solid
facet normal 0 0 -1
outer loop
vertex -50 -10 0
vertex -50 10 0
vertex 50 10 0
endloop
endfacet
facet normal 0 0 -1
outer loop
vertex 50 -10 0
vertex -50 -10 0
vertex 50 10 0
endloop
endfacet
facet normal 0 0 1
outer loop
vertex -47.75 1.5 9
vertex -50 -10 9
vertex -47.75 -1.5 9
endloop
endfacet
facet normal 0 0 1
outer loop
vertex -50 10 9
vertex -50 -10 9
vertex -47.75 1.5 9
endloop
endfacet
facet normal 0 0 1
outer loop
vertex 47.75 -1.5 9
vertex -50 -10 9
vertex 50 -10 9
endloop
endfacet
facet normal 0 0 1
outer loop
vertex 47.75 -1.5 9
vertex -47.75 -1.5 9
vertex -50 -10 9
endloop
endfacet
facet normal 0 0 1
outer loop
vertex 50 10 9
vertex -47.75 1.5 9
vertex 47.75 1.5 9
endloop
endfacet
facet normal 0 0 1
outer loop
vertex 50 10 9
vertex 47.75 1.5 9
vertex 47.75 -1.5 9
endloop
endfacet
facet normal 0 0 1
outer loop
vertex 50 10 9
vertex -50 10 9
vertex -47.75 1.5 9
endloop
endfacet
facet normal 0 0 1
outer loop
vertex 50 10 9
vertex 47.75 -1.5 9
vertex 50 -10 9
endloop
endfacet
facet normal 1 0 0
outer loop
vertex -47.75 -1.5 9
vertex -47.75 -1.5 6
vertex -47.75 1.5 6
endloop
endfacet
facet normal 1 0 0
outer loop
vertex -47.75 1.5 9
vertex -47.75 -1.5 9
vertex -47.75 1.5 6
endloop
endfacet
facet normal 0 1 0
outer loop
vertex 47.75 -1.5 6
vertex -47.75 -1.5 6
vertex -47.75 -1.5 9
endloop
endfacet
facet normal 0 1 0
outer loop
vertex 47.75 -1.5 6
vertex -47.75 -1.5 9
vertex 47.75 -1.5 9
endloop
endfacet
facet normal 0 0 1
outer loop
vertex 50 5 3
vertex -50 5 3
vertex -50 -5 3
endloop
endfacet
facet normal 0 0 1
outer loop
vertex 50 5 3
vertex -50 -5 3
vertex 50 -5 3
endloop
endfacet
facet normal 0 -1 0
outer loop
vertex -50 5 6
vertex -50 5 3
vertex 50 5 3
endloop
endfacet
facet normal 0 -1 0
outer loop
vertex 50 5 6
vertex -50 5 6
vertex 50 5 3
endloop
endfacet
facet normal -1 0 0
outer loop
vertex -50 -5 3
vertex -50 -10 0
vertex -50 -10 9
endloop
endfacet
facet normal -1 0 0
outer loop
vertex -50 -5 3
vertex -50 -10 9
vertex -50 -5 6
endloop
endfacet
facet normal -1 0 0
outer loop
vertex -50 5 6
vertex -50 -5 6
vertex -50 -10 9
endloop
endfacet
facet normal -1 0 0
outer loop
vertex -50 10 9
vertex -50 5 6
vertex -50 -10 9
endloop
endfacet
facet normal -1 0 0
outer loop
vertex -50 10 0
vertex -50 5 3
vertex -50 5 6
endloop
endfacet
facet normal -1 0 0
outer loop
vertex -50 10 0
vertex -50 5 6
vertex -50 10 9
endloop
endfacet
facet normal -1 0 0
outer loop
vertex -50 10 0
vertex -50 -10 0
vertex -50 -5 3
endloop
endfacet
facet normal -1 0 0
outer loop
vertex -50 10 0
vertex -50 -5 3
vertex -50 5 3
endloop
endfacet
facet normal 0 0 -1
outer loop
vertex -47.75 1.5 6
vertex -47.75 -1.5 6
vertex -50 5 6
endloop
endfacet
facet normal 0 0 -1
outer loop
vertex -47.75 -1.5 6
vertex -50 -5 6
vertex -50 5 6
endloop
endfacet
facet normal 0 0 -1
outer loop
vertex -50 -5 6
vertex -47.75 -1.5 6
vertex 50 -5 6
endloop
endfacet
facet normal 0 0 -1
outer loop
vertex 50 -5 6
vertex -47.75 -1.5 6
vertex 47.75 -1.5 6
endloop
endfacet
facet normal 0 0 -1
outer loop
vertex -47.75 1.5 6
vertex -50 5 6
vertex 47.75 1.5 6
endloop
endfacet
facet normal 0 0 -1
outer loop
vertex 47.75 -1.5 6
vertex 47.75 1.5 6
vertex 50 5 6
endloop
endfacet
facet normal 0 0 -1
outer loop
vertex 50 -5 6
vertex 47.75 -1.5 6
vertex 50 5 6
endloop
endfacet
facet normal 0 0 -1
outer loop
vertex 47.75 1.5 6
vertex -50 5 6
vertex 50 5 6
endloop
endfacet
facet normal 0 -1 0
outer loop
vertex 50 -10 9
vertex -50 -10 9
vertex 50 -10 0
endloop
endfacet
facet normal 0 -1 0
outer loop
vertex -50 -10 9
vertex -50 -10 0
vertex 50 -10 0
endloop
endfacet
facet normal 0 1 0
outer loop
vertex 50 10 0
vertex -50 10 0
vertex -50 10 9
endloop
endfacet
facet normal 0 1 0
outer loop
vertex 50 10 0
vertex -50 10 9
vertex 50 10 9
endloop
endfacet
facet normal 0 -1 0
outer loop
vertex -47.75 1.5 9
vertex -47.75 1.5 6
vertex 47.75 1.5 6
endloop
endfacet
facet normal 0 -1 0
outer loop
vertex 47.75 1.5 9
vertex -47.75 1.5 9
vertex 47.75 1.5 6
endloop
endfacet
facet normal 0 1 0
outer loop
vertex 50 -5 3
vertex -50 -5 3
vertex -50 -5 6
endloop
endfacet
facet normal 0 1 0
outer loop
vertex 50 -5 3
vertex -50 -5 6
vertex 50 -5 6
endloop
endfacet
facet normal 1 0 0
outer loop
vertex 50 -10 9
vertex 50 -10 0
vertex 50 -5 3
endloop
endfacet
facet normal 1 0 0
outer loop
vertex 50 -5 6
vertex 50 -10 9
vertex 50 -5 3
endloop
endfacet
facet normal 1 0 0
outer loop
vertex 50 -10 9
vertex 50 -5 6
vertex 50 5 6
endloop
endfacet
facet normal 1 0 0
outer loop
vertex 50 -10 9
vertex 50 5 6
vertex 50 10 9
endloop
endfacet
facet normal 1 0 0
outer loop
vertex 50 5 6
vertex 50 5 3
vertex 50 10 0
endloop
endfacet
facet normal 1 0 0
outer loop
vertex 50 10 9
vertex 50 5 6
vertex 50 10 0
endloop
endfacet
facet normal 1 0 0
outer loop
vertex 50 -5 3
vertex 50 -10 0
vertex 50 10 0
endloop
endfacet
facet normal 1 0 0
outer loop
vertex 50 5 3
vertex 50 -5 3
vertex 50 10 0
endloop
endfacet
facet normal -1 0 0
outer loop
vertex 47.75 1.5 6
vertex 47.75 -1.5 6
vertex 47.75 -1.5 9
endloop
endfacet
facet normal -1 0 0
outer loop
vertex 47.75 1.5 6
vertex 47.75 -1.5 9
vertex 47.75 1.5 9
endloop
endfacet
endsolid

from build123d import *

# Parameters (mm, degrees)
SKETCH_W      = 100
SKETCH_H      = 20
PAD_DEPTH     = 3
SKETCH001_W   = 100
SKETCH001_H   = 5
PAD001_DEPTH  = 3
SKETCH002_W   = 100
SKETCH002_H   = 20
SKETCH002_W_2 = 95.5
SKETCH002_H_2 = 3
PAD002_DEPTH  = 3


with BuildPart() as part:
    # Sketch → Pad (new body)
    with BuildSketch(Plane.XY):
        Rectangle(SKETCH_W, SKETCH_H)
    extrude(amount=PAD_DEPTH)

    # Sketch001 (on Face6 of Pad) → Pad001 (join)
    with BuildSketch(Plane.XY.offset(3)):
        with Locations((0, 7.5)):
            Rectangle(SKETCH001_W, SKETCH001_H)
        with Locations((0, -7.5)):
            Rectangle(SKETCH001_W, SKETCH001_H)
    extrude(amount=PAD001_DEPTH)

    # Sketch002 (on Face12 of Pad001) → Pad002 (join)
    with BuildSketch(Plane.XY.offset(6)):
        Rectangle(SKETCH002_W, SKETCH002_H)
        Rectangle(SKETCH002_W_2, SKETCH002_H_2, mode=Mode.SUBTRACT)
    extrude(amount=PAD002_DEPTH)


solid = part.part
